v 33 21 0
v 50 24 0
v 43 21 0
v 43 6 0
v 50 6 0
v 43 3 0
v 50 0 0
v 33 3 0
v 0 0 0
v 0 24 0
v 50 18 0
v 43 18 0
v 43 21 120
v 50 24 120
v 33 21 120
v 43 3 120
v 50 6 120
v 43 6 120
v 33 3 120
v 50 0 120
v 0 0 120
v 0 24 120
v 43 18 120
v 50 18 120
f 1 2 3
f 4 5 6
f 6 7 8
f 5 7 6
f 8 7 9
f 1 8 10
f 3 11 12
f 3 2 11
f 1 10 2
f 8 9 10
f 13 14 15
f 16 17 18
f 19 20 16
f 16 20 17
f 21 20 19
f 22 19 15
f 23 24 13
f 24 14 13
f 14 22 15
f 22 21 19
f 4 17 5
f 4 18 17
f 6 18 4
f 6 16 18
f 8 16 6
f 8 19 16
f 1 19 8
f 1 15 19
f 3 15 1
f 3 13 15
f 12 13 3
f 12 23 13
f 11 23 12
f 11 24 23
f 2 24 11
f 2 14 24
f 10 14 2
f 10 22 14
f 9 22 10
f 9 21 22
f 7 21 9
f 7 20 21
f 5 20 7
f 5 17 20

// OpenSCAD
$fn = 32;

// ----------------------------------------------------------------------
// T-slot rail: 50 x 24 mm section, 120 mm long
// ----------------------------------------------------------------------

// --- parameters (mm) ---
profile_height = 120;     // extrusion height
profile_points = 12;      // points of the closed outline

profile = [[0, 0], [50, 0], [50, 6], [43, 6], [43, 3], [33, 3], [33, 21], [43, 21], [43, 18], [50, 18], [50, 24], [0, 24]];  // single closed polygon, 12 points, counter clockwise

// --- the one profile operation ---
linear_extrude(height = profile_height) polygon(points = profile);
